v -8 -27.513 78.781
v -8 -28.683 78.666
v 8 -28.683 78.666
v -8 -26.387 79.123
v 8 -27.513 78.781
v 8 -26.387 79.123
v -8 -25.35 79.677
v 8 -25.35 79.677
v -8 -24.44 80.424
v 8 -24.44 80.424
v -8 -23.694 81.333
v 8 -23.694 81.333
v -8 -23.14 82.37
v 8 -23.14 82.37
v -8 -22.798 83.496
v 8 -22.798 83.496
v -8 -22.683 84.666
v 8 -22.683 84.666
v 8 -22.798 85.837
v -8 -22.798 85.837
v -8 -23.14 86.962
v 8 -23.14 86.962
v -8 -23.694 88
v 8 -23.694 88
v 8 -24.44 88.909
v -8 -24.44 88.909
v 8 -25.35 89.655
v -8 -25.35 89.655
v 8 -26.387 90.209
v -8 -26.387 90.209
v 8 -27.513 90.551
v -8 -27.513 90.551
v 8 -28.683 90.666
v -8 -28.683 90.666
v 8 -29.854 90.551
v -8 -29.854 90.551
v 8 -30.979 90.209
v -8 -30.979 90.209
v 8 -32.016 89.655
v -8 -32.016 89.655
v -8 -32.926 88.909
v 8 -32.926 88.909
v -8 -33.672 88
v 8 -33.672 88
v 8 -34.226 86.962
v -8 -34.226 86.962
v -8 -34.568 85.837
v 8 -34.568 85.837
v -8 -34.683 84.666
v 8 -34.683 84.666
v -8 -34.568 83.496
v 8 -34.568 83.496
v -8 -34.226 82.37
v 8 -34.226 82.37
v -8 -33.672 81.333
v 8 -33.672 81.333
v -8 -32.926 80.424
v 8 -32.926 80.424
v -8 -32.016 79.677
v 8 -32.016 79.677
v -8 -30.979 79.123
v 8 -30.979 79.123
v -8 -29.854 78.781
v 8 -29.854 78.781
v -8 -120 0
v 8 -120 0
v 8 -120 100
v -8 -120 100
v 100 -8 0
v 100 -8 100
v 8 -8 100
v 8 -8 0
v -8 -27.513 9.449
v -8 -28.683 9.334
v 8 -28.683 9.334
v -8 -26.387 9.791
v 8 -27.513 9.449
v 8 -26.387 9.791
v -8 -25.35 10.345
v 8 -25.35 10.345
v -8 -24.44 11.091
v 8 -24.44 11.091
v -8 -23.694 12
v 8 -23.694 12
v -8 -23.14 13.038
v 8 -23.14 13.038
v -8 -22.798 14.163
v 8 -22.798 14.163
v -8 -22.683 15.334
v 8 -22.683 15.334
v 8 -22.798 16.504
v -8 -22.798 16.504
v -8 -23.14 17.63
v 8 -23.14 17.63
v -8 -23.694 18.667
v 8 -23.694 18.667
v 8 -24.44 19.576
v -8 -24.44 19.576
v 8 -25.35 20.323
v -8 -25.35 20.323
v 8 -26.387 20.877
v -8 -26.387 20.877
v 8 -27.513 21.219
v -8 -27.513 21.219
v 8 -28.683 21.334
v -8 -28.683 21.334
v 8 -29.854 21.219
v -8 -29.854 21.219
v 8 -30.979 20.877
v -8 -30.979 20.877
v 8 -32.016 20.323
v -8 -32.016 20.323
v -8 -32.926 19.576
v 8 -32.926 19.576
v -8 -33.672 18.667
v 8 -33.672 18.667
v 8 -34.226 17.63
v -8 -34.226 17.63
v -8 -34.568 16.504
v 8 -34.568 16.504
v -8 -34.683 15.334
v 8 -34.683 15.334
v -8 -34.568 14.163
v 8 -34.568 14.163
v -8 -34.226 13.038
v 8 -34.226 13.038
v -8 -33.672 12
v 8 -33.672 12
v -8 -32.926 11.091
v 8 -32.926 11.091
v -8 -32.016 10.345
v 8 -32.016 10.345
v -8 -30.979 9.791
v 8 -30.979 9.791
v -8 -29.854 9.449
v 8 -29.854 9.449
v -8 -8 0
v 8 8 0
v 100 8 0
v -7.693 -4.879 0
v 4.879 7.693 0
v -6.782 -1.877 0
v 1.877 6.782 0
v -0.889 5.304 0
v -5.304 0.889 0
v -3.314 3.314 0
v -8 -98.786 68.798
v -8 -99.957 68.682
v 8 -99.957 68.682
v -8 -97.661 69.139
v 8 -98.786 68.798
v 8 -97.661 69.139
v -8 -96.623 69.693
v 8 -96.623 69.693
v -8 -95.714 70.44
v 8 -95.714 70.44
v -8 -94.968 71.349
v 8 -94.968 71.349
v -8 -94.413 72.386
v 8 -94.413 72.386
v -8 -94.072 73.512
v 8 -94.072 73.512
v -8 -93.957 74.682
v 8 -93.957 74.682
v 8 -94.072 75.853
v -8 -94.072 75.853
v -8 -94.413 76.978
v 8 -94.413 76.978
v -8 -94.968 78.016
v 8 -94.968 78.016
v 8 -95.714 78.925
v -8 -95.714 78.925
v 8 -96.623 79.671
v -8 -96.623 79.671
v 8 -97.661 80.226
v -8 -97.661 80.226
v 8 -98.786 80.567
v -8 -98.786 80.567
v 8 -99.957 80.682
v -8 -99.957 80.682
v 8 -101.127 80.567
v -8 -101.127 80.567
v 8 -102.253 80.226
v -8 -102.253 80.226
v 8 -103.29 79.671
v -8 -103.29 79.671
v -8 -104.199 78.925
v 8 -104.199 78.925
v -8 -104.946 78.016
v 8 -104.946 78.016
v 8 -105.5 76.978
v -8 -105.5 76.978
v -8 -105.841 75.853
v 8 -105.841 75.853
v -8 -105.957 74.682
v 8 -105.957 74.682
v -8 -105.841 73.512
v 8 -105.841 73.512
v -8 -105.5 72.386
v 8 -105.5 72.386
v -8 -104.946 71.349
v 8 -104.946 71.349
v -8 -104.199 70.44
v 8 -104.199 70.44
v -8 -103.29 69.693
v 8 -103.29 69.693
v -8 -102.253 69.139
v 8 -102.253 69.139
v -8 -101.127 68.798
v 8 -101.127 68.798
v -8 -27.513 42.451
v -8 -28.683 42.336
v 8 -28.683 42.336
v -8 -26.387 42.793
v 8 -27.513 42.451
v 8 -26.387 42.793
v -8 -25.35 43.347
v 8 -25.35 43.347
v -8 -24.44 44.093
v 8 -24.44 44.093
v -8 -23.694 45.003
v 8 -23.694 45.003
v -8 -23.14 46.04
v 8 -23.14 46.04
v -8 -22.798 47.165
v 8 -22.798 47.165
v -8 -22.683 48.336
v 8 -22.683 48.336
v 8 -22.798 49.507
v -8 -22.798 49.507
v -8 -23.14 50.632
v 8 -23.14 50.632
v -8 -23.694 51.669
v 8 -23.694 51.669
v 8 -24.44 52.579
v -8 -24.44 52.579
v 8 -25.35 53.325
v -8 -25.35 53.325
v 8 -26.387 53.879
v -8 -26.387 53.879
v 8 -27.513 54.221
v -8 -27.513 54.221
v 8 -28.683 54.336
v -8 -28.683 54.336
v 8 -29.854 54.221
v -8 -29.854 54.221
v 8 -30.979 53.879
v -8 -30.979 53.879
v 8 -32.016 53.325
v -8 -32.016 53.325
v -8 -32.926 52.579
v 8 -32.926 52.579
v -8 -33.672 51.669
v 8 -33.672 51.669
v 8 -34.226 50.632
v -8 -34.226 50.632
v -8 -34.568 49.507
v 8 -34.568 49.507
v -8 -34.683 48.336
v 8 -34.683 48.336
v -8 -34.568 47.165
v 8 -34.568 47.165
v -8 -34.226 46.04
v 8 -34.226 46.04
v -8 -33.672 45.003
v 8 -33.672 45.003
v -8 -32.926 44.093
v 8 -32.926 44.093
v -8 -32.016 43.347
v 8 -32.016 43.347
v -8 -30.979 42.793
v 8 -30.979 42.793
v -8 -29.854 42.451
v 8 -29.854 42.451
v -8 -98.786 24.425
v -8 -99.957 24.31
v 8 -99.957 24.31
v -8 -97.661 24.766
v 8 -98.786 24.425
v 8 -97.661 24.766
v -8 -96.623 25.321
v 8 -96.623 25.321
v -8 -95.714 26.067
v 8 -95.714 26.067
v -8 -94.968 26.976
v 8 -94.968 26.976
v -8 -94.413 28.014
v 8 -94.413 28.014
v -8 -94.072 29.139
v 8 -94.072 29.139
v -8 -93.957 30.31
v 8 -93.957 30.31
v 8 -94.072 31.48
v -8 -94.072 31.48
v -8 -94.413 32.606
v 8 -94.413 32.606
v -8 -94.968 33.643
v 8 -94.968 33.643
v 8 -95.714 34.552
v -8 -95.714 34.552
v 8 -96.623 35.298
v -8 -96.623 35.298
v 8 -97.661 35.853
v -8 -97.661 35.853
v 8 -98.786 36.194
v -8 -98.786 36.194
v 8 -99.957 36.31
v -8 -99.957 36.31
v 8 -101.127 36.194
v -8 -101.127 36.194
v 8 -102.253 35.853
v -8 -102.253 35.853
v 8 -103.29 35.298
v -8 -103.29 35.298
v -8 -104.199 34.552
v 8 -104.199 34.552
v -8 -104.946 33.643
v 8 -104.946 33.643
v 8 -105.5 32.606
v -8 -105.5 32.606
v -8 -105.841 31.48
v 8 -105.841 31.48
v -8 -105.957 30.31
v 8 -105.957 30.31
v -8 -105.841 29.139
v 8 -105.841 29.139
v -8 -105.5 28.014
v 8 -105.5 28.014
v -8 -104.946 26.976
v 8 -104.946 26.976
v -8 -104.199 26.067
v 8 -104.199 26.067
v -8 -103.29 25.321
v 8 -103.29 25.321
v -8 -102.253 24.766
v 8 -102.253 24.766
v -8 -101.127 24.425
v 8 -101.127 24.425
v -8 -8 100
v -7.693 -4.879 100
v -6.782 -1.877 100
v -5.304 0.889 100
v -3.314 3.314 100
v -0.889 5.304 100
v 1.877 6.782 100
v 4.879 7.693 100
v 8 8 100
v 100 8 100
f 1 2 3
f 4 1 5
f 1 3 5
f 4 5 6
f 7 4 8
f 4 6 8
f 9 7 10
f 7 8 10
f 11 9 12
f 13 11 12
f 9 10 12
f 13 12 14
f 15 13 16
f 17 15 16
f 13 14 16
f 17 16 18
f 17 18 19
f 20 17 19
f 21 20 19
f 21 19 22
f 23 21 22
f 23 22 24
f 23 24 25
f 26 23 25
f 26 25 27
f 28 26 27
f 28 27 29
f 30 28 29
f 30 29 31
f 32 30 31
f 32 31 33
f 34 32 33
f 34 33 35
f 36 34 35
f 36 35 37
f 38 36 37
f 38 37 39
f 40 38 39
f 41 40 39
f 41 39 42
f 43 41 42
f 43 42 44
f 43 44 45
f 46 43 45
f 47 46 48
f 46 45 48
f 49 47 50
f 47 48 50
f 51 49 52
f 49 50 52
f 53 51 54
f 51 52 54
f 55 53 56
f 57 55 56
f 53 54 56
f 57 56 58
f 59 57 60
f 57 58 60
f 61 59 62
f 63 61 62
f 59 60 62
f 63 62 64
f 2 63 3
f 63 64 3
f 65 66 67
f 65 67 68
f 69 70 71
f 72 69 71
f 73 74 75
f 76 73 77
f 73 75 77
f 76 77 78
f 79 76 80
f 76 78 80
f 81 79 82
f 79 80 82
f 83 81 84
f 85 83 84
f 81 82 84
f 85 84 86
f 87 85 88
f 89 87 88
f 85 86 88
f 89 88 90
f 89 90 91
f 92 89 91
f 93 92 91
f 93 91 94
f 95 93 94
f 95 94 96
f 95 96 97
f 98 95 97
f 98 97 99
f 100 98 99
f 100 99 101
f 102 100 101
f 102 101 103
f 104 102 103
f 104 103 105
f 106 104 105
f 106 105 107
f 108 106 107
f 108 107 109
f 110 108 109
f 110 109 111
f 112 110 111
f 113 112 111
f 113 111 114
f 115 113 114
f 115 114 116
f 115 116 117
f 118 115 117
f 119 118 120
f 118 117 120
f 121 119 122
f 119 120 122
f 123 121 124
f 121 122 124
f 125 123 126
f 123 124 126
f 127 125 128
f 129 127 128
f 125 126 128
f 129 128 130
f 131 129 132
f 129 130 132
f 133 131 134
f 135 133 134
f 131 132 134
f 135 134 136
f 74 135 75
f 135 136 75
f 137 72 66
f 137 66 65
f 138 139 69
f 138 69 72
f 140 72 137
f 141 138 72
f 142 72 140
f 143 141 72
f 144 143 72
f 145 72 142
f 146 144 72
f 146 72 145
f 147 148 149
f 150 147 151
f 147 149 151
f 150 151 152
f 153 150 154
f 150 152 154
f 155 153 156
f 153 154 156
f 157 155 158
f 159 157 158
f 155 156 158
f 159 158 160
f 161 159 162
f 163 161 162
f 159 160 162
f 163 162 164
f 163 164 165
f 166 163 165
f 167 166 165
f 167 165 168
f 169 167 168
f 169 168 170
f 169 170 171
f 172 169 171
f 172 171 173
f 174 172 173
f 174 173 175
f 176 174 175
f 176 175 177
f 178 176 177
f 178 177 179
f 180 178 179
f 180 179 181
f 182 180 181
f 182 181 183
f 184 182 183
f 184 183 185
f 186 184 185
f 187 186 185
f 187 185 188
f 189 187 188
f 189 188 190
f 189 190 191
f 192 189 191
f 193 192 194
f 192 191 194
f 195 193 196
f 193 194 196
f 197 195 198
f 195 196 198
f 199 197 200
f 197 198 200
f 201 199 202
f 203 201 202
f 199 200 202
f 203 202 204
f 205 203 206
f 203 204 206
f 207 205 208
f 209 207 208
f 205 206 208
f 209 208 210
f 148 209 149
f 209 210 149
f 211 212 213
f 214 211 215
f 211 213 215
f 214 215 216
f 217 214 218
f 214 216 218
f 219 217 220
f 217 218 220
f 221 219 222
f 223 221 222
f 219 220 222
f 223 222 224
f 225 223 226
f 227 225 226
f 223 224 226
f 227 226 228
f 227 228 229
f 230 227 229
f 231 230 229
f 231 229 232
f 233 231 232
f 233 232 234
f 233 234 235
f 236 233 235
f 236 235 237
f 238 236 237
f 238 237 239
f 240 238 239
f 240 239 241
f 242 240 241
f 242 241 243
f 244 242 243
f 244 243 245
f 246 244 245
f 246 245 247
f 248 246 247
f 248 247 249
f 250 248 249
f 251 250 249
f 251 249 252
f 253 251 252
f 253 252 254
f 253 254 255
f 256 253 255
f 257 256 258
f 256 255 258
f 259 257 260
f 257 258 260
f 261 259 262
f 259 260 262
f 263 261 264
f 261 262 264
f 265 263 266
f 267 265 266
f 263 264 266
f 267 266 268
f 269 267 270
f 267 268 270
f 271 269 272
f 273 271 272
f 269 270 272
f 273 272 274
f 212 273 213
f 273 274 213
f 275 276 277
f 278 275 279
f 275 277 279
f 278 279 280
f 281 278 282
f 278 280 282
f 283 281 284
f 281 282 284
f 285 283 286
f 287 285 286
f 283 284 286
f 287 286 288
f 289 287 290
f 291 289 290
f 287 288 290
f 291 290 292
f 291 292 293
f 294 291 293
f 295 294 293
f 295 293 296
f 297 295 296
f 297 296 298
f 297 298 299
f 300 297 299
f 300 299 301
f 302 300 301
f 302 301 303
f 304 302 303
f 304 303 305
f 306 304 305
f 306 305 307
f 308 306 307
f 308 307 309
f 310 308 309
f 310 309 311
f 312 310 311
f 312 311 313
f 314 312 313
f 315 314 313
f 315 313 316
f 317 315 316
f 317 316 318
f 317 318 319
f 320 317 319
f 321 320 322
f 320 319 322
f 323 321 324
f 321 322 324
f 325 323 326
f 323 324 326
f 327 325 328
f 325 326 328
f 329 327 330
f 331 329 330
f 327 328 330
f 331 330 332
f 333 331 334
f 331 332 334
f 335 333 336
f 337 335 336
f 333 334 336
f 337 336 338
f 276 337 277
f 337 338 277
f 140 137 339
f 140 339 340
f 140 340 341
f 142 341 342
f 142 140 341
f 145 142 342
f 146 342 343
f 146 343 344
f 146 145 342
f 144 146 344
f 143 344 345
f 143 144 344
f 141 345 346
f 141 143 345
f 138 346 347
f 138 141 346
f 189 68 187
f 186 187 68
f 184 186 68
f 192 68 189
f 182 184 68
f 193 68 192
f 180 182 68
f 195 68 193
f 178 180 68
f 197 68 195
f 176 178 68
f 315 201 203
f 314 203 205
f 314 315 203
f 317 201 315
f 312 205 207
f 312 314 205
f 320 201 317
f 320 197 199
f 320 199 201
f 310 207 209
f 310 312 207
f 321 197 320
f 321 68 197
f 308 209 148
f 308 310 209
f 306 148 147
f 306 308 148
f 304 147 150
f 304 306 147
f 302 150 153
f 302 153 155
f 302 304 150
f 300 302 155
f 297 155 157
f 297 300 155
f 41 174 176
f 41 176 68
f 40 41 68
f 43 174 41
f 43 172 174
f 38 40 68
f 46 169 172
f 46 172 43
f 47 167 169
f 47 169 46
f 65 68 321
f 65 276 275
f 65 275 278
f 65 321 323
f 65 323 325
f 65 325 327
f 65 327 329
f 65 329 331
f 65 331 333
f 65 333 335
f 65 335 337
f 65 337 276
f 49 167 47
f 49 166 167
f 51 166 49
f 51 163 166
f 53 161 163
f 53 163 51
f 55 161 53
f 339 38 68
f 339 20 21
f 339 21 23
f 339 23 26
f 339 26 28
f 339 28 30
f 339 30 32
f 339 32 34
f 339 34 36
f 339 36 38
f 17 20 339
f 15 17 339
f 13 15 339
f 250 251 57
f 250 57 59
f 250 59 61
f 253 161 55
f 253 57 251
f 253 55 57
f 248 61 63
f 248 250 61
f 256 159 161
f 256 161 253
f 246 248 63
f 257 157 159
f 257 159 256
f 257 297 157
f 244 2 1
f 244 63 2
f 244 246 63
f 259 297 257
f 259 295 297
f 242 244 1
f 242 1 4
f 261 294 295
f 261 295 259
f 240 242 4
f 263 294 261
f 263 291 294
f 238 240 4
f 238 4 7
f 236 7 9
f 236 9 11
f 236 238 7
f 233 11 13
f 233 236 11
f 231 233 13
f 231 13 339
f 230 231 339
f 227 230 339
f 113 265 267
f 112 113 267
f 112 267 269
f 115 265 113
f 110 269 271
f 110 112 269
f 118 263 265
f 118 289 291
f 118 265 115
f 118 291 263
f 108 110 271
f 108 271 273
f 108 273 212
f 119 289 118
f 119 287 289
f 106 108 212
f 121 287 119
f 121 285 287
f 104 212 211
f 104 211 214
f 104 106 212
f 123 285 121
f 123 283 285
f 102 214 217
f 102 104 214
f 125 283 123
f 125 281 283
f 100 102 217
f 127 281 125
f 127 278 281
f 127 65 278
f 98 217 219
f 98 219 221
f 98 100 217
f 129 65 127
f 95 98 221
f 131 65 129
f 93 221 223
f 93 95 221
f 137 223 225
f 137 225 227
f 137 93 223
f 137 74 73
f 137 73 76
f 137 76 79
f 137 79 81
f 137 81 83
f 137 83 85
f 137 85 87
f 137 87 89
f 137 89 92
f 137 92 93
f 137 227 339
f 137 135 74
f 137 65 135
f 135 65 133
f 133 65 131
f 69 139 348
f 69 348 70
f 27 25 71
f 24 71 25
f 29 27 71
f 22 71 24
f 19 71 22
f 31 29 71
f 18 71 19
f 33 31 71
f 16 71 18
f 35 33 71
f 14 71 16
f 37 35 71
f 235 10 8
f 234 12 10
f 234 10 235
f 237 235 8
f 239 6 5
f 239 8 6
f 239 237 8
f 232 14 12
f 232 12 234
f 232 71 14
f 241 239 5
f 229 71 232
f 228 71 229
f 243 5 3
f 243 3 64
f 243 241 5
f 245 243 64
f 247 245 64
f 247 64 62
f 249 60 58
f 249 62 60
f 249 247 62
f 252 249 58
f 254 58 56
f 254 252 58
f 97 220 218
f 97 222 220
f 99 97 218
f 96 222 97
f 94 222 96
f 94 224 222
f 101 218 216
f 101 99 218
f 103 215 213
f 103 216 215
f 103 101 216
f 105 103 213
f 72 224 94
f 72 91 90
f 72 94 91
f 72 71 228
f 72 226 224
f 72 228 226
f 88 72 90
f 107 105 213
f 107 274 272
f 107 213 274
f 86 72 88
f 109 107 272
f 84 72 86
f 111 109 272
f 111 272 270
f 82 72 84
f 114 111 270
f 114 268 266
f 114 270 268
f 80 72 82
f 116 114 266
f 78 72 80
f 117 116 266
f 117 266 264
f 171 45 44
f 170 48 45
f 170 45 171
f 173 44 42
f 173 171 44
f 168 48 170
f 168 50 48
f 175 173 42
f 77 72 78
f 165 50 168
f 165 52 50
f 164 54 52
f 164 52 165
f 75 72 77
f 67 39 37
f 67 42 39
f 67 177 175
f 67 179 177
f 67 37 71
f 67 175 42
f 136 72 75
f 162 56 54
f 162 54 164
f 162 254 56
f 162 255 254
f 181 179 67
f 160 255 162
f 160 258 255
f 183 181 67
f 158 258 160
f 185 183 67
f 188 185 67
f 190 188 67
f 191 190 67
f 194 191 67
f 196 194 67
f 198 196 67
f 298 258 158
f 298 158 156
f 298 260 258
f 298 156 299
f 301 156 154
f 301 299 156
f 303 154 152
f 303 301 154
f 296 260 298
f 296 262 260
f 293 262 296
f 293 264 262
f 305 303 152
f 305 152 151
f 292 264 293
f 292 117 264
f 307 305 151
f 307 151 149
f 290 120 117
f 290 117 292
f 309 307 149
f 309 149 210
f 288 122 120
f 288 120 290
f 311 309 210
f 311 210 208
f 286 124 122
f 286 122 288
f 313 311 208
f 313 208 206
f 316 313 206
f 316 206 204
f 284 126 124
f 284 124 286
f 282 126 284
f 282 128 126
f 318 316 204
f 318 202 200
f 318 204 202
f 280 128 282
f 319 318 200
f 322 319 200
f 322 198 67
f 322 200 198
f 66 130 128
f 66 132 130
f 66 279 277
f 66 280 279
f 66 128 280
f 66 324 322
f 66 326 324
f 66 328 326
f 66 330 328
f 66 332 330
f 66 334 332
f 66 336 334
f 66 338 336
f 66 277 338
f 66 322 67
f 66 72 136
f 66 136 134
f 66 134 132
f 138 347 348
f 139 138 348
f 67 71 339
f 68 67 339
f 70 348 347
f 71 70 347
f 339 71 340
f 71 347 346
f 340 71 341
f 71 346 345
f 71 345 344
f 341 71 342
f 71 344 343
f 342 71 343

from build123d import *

# Parameters (mm, degrees)
SALIENTE_EXTRUIR1_DEPTH = 100
CROQUIS2_R              = 6
CORTAR_EXTRUIR1_DEPTH   = 100


with BuildPart() as part:
    # Croquis1 → Saliente-Extruir1 (new body)
    with BuildSketch(Plane.XY):
        with BuildLine():
            Line((8, -8), (8, -120))
            Line((8, -120), (-8, -120))
            Line((-8, -120), (-8, -8))
            ThreePointArc((-8, -8), (-3.313708499, 3.313708499), (8, 8))
            Line((8, 8), (100, 8))
            Line((100, 8), (100, -8))
            Line((100, -8), (8, -8))
        make_face()
    extrude(amount=SALIENTE_EXTRUIR1_DEPTH)

    # Croquis2 → Cortar-Extruir1 (cut)
    with BuildSketch(Plane(origin=(8, 0, 0), x_dir=(0, 0, -1), z_dir=(1, 0, 0))):
        with Locations((-84.666164139, -28.683062658)):
            Circle(CROQUIS2_R)
        with Locations((-48.336024121, -28.683062658)):
            Circle(CROQUIS2_R)
        with Locations((-15.333835861, -28.683062658)):
            Circle(CROQUIS2_R)
        with Locations((-74.682308867, -99.956696128)):
            Circle(CROQUIS2_R)
        with Locations((-30.309618769, -99.956696128)):
            Circle(CROQUIS2_R)
    extrude(amount=-CORTAR_EXTRUIR1_DEPTH, mode=Mode.SUBTRACT)


solid = part.part
